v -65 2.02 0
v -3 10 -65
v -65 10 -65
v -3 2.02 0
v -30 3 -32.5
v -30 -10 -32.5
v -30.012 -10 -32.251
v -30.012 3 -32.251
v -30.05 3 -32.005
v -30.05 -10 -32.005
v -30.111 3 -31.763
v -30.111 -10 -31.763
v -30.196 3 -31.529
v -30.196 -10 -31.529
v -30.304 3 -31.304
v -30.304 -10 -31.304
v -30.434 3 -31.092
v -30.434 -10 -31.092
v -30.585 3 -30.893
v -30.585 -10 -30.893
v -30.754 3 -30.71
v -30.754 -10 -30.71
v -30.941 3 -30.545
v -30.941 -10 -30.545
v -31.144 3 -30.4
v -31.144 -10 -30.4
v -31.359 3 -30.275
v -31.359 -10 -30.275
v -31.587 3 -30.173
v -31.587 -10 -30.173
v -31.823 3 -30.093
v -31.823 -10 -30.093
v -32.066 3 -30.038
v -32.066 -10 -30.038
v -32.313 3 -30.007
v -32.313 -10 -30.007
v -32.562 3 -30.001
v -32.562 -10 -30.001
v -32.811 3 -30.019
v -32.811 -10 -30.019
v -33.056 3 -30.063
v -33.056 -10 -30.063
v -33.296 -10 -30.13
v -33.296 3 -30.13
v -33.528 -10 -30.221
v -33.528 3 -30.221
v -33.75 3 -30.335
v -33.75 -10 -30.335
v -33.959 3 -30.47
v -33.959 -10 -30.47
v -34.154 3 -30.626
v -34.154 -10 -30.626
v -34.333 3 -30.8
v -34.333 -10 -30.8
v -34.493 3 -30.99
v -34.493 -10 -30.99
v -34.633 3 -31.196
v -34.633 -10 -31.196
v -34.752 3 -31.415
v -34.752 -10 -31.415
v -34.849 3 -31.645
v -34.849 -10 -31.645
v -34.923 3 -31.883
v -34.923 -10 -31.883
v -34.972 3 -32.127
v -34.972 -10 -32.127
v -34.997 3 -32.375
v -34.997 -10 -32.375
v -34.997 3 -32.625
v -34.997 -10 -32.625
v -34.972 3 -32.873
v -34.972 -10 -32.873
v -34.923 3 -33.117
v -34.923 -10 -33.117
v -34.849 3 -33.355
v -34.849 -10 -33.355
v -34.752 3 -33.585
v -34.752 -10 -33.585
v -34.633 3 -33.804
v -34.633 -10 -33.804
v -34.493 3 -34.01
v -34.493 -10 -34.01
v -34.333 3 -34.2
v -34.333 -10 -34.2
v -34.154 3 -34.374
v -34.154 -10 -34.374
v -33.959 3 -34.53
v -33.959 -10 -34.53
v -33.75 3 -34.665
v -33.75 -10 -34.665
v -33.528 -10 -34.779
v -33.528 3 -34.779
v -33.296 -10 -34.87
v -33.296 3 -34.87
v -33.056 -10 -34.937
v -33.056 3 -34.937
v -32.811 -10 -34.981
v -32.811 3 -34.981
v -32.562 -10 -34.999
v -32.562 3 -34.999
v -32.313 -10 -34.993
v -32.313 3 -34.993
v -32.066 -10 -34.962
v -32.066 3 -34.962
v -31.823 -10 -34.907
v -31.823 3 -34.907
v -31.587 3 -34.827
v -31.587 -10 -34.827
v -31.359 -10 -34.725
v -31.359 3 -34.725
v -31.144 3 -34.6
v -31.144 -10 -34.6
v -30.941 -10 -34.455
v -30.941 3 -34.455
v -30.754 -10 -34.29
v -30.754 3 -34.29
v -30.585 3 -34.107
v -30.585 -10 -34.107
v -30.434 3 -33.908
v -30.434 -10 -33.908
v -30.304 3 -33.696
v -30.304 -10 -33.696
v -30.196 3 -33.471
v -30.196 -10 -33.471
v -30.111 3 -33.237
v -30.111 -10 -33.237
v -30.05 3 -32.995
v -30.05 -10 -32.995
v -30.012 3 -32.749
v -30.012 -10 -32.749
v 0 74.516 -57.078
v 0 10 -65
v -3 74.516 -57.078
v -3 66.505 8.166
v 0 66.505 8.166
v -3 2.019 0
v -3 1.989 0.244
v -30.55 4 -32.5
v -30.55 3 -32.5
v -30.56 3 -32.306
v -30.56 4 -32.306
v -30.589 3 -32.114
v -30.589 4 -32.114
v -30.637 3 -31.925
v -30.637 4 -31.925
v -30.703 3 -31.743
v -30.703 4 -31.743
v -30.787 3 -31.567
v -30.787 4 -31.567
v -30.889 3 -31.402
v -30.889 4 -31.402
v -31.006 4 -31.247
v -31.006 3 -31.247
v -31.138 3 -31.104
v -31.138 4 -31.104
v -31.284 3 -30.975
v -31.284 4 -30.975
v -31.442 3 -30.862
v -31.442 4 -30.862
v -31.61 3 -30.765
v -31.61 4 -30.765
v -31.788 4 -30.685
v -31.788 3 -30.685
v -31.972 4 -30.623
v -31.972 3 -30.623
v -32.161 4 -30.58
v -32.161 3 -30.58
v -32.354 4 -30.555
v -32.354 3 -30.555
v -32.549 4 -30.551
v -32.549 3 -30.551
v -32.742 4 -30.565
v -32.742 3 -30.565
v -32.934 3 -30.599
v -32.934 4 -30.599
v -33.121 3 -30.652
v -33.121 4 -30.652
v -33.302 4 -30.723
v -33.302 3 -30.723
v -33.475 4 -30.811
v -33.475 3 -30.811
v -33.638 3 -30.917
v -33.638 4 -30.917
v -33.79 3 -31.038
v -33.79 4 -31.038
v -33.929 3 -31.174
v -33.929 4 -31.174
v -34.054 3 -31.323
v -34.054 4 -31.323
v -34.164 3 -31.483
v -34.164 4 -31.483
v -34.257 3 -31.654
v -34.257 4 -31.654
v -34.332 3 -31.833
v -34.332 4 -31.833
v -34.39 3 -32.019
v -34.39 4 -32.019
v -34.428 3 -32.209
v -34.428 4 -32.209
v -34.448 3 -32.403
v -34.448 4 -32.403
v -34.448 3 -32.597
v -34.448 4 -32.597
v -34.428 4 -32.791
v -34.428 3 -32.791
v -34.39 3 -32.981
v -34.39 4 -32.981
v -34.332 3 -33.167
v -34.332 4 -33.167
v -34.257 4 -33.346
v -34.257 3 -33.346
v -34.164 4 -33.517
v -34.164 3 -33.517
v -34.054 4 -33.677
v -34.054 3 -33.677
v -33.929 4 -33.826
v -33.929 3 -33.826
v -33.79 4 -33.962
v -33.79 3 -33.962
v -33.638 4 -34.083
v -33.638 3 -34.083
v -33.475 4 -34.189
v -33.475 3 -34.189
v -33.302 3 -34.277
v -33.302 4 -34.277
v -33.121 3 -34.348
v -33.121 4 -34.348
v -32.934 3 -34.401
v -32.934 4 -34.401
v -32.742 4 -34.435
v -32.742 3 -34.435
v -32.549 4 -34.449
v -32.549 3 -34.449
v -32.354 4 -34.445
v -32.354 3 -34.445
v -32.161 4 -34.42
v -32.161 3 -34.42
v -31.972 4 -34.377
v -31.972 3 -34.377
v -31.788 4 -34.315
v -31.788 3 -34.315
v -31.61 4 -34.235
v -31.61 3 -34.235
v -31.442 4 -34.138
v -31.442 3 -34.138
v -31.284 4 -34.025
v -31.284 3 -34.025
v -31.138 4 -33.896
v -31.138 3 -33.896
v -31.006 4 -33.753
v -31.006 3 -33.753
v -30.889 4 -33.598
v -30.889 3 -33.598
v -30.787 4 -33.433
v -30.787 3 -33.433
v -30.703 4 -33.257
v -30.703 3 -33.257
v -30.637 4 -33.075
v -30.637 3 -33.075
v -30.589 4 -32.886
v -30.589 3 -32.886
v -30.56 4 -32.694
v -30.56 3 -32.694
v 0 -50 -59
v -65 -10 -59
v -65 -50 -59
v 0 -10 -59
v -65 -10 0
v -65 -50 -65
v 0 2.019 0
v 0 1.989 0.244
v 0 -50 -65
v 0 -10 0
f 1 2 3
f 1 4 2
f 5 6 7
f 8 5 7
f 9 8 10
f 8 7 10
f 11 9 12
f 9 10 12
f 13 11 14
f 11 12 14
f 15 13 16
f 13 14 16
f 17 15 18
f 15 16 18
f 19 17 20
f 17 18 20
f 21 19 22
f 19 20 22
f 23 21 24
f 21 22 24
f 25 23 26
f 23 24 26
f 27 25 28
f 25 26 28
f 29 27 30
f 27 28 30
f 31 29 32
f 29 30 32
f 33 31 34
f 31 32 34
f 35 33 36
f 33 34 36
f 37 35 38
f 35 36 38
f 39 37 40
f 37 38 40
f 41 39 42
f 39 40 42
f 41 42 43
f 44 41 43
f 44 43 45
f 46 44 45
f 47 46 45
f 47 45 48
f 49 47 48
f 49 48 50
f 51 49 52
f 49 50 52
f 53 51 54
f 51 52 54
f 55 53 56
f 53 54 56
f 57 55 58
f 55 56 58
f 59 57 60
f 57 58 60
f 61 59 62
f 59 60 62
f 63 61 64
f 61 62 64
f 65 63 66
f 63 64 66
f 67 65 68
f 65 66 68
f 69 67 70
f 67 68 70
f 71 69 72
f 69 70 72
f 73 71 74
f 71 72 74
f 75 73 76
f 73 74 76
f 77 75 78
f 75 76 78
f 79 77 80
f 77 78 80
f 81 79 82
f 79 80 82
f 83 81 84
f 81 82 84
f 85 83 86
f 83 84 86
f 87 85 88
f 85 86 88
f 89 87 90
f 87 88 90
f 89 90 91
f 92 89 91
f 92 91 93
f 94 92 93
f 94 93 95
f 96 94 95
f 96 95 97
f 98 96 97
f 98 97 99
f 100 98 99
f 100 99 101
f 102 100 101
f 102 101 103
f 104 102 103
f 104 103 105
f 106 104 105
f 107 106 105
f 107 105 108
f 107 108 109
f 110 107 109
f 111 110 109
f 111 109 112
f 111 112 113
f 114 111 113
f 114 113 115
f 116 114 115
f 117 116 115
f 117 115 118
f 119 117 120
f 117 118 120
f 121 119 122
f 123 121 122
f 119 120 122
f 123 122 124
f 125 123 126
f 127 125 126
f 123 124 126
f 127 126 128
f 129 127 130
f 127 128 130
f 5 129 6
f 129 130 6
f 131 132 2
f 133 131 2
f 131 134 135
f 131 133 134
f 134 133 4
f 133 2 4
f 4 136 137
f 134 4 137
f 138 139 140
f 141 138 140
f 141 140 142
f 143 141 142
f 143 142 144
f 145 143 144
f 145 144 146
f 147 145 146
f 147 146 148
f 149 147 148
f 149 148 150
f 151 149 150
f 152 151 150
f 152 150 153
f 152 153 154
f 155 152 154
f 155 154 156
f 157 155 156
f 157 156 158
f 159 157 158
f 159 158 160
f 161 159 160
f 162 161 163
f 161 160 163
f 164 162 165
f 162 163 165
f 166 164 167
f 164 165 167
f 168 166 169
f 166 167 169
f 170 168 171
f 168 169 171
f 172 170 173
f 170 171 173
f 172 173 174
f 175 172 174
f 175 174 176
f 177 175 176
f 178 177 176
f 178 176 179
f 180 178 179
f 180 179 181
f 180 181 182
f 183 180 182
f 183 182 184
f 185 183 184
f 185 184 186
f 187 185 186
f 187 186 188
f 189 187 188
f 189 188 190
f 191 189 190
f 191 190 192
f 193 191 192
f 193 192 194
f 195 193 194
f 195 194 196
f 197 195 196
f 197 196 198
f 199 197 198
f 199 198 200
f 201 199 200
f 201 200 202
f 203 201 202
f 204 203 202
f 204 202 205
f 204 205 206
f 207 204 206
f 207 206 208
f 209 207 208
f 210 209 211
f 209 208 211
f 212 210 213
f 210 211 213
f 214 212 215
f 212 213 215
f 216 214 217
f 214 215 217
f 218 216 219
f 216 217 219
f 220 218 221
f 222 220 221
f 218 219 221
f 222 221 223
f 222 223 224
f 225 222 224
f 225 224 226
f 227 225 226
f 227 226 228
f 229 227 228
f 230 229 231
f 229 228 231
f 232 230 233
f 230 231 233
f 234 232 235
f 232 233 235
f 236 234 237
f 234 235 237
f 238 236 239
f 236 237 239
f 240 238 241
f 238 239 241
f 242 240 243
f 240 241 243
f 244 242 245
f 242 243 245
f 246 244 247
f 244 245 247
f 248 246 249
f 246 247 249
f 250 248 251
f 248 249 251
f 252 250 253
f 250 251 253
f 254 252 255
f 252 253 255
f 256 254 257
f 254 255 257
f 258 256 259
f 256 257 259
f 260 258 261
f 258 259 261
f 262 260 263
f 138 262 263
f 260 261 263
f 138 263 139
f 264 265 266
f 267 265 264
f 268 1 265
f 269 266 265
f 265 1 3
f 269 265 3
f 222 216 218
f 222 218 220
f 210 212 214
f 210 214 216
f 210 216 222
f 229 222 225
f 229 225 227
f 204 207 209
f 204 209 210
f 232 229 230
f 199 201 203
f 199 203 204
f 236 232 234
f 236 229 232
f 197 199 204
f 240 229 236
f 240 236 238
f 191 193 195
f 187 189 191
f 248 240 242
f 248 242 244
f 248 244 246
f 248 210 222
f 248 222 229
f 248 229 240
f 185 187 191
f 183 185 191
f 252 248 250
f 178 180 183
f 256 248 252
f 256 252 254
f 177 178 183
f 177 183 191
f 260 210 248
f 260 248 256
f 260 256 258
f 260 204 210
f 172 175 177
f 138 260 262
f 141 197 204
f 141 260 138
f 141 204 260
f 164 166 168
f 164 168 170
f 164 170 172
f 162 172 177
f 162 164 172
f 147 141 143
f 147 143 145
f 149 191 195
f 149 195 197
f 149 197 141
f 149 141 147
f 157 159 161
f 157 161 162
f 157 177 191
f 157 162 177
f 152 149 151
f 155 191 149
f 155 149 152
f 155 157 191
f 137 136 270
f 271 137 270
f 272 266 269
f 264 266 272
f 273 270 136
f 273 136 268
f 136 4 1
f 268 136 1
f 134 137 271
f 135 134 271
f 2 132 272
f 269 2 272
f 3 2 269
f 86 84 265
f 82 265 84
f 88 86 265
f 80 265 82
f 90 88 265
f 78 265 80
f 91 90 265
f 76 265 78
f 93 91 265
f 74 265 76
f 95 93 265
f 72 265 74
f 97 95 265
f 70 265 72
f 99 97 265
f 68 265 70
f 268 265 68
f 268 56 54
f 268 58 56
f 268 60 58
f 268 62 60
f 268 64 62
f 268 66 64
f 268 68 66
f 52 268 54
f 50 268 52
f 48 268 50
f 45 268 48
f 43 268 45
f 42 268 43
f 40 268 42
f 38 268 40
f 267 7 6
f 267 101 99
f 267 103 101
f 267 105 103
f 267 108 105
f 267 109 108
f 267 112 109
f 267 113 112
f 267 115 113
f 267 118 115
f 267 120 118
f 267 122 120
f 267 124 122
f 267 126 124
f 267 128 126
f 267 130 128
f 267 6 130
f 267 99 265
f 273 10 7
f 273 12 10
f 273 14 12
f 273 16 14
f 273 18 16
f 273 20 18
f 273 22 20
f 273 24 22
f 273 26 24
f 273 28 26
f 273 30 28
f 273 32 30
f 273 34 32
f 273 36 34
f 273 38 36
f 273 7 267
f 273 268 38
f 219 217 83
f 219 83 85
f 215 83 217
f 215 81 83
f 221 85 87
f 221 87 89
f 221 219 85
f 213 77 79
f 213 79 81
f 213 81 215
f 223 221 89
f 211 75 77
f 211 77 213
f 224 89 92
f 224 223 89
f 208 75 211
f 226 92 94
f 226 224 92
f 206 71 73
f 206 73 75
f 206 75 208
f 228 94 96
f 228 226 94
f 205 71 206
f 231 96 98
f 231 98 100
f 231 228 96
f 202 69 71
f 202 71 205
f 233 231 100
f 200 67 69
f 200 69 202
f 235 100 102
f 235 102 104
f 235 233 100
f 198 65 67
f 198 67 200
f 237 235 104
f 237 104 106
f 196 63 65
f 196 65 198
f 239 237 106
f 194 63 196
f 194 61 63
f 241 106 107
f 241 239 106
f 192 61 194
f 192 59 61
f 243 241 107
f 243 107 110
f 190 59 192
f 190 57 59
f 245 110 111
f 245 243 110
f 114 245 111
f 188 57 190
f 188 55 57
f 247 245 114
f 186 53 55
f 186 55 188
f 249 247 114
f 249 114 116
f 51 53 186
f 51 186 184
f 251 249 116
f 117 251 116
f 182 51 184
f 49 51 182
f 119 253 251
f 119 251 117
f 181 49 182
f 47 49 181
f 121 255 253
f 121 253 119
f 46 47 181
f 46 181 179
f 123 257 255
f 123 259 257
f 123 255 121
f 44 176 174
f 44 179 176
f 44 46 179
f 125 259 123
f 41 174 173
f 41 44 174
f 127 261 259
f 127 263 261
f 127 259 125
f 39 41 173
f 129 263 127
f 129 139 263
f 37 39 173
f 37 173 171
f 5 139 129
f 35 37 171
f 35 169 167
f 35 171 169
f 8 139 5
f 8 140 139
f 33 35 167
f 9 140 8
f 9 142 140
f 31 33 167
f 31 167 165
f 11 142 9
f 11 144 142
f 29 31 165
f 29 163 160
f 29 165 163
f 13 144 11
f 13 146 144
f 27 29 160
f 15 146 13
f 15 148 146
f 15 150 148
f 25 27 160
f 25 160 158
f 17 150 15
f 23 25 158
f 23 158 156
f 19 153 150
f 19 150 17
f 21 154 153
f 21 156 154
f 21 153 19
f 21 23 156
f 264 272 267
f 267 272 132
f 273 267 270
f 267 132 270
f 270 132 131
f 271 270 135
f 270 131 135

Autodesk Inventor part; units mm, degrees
ref_plane "YZ Plane" through (0, 0, 0) normal (1, 0, 0) x (0, 1, 0)
ref_plane "XZ Plane" through (0, 0, 0) normal (0, 1, 0) x (-1, 0, 0)
ref_plane "XY Plane" through (0, 0, 0) normal (0, 0, 1) x (1, 0, 0)
sketch "草图1" plane through (0, 0, 0) normal (0, 1, 0) x (-1, 0, 0)
  line L0 (0, 0) -> (65, 0)
  line L1 (65, 0) -> (65, -65)
  line L2 (65, -65) -> (0, -65)
  line L3 (0, -65) -> (0, 0)
  dimension "d0" = 65
  dimension "d1" = 65
extrude "拉伸1" add sketch "草图1" along normal blind 10
chamfer "倒角1" distance 65 angle 7 1 edges at (-32.5, 10, 0) measured on face at (-43.3333, 10, -43.3333)
sketch "草图2" plane through (0, 0, 0) normal (0, -1, 0) x (1, 0, 0)
  line L0 (-65, 0) -> (0, 0) projected
  line L1 (-32.5, 0) -> (-32.5, -65)
  line L2 (0, -65) -> (-65, -65) projected
  circle A0 centre (-32.5, -32.5) radius 1.95
  dimension "d7" = 3.9
extrude "拉伸2" cut sketch "草图2" against normal blind 4
sketch "草图3" plane through (0, 0, 0) normal (0, -1, 0) x (1, 0, 0)
  line L0 (0, -65) -> (-65, -65) projected
  line L1 (-65, -65) -> (-65, 0) projected
  line L2 (0, -65) -> (-65, -65)
  line L3 (-65, -65) -> (-65, -59)
  line L4 (-65, -59) -> (0, -59)
  line L5 (0, -59) -> (0, -65)
  point P0 (0, 0)
  dimension "d10" = 6
extrude "拉伸3" add sketch "草图3" along normal blind 50
sketch "草图4" plane through (-65, 10, -65) normal (0, 0.9925, 0.1219) x (1, 0, 0)
  line L0 (65, -7.3122) -> (65, 0) projected
  line L1 (65, 0) -> (62, 0)
  line L2 (62, 0) -> (62, -65.7342)
  line L3 (62, -65.7342) -> (65, -65.7342)
  line L4 (65, -65.7342) -> (65, 0)
  point P0 (65, -65.7342)
  dimension "d13" = 3
extrude "拉伸4" add sketch "草图4" along normal blind 65
sketch "草图5" plane through (0, 0, 0) normal (0, -1, 0) x (1, 0, 0)
  line L0 (-65, -59) -> (-65, -65) projected
  line L1 (0, 0) -> (-65, 0)
  line L2 (-65, 0) -> (-65, -59)
  line L3 (-65, -59) -> (0, -59)
  line L4 (0, -59) -> (0, 0)
extrude "拉伸5" add sketch "草图5" along normal blind 10
sketch "草图6" plane through (0, -10, 0) normal (0, -1, 0) x (1, 0, 0)
  circle A0 centre (-32.5, -32.5) radius 1.95 projected
  circle A1 centre (-32.5, -32.5) radius 2.5
  point P0 (0, 0)
  dimension "d18" = 5
extrude "拉伸6" cut sketch "草图6" against normal blind 13 contours A0 | A1
equation "\"折弯半径\" = 厚度"
equation "\"折弯释压宽度\" = 厚度"
equation "\"折弯释压深度\" = 0.5 * 厚度"
equation "\"拐角释压尺寸\" = 4 * 厚度"
equation "\"最小余量\" = 2 * 厚度"
equation "\"过渡半径\" = 折弯半径"
equation "\"Jacobi半径尺寸\" = 折弯半径"
equation "\"间隙大小\" = 厚度"
equation "\"厚度\" = 0.5"
properties part number "斜面"
